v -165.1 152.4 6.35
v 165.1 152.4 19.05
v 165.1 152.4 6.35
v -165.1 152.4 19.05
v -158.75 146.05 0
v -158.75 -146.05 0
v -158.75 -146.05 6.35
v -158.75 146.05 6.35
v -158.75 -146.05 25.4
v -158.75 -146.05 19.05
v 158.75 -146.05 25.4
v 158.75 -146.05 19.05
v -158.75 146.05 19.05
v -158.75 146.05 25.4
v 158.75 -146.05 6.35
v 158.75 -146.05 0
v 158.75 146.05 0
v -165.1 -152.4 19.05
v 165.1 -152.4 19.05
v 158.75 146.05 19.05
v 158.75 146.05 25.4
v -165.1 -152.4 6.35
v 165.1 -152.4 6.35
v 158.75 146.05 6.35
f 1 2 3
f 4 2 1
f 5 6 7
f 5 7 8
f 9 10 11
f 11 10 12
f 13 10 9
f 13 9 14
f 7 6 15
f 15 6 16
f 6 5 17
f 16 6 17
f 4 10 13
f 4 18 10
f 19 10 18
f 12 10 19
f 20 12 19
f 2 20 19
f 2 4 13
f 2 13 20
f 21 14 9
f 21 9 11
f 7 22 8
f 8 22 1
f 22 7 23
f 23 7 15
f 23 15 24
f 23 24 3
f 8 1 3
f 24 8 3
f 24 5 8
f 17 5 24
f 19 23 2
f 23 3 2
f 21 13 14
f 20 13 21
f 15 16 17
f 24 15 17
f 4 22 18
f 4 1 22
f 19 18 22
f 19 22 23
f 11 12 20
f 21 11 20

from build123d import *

# Parameters (mm, degrees)
F0_W     = 317.5
F0_H     = 292.1
F1_DEPTH = 25.4
F2_W     = 292.1
F2_H     = 12.7
F3_DEPTH = 6.35
F4_W     = 292.1
F4_H     = 12.7
F5_DEPTH = 6.35
F7_DEPTH = 6.35
F8_W     = 330.2
F8_H     = 12.7
F9_DEPTH = 6.35


with BuildPart() as f1:
    # F0 (on Top) → F1 (new body)
    with BuildSketch(Plane.XY):
        Rectangle(F0_W, F0_H)
    extrude(amount=F1_DEPTH)

    # F2 (on face) → F3 (join)
    with BuildSketch(Plane.YZ.offset(158.75)):
        with Locations((0, 12.7)):
            Rectangle(F2_W, F2_H)
    extrude(amount=F3_DEPTH)

    # F4 (on face) → F5 (join)
    with BuildSketch(Plane(origin=(-158.75, 0, 0), x_dir=(0, -1, 0), z_dir=(-1, 0, 0))):
        with Locations((0, 12.7)):
            Rectangle(F4_W, F4_H)
    extrude(amount=F5_DEPTH)

    # F6 (on face) → F7 (join)
    with BuildSketch(Plane(origin=(0, 146.05, 0), x_dir=(-1, 0, 0), z_dir=(0, 1, 0))):
        Polygon((-158.75, 19.05), (-165.1, 19.05), (-165.1, 6.35), (-158.75, 6.35), (158.75, 6.35), (165.1, 6.35), (165.1, 19.05), (158.75, 19.05), align=None)
    extrude(amount=F7_DEPTH)

    # F8 (on face) → F9 (join)
    with BuildSketch(Plane.XZ.offset(146.05)):
        with Locations((0, 12.7)):
            Rectangle(F8_W, F8_H)
    extrude(amount=F9_DEPTH)


solid = f1.part
